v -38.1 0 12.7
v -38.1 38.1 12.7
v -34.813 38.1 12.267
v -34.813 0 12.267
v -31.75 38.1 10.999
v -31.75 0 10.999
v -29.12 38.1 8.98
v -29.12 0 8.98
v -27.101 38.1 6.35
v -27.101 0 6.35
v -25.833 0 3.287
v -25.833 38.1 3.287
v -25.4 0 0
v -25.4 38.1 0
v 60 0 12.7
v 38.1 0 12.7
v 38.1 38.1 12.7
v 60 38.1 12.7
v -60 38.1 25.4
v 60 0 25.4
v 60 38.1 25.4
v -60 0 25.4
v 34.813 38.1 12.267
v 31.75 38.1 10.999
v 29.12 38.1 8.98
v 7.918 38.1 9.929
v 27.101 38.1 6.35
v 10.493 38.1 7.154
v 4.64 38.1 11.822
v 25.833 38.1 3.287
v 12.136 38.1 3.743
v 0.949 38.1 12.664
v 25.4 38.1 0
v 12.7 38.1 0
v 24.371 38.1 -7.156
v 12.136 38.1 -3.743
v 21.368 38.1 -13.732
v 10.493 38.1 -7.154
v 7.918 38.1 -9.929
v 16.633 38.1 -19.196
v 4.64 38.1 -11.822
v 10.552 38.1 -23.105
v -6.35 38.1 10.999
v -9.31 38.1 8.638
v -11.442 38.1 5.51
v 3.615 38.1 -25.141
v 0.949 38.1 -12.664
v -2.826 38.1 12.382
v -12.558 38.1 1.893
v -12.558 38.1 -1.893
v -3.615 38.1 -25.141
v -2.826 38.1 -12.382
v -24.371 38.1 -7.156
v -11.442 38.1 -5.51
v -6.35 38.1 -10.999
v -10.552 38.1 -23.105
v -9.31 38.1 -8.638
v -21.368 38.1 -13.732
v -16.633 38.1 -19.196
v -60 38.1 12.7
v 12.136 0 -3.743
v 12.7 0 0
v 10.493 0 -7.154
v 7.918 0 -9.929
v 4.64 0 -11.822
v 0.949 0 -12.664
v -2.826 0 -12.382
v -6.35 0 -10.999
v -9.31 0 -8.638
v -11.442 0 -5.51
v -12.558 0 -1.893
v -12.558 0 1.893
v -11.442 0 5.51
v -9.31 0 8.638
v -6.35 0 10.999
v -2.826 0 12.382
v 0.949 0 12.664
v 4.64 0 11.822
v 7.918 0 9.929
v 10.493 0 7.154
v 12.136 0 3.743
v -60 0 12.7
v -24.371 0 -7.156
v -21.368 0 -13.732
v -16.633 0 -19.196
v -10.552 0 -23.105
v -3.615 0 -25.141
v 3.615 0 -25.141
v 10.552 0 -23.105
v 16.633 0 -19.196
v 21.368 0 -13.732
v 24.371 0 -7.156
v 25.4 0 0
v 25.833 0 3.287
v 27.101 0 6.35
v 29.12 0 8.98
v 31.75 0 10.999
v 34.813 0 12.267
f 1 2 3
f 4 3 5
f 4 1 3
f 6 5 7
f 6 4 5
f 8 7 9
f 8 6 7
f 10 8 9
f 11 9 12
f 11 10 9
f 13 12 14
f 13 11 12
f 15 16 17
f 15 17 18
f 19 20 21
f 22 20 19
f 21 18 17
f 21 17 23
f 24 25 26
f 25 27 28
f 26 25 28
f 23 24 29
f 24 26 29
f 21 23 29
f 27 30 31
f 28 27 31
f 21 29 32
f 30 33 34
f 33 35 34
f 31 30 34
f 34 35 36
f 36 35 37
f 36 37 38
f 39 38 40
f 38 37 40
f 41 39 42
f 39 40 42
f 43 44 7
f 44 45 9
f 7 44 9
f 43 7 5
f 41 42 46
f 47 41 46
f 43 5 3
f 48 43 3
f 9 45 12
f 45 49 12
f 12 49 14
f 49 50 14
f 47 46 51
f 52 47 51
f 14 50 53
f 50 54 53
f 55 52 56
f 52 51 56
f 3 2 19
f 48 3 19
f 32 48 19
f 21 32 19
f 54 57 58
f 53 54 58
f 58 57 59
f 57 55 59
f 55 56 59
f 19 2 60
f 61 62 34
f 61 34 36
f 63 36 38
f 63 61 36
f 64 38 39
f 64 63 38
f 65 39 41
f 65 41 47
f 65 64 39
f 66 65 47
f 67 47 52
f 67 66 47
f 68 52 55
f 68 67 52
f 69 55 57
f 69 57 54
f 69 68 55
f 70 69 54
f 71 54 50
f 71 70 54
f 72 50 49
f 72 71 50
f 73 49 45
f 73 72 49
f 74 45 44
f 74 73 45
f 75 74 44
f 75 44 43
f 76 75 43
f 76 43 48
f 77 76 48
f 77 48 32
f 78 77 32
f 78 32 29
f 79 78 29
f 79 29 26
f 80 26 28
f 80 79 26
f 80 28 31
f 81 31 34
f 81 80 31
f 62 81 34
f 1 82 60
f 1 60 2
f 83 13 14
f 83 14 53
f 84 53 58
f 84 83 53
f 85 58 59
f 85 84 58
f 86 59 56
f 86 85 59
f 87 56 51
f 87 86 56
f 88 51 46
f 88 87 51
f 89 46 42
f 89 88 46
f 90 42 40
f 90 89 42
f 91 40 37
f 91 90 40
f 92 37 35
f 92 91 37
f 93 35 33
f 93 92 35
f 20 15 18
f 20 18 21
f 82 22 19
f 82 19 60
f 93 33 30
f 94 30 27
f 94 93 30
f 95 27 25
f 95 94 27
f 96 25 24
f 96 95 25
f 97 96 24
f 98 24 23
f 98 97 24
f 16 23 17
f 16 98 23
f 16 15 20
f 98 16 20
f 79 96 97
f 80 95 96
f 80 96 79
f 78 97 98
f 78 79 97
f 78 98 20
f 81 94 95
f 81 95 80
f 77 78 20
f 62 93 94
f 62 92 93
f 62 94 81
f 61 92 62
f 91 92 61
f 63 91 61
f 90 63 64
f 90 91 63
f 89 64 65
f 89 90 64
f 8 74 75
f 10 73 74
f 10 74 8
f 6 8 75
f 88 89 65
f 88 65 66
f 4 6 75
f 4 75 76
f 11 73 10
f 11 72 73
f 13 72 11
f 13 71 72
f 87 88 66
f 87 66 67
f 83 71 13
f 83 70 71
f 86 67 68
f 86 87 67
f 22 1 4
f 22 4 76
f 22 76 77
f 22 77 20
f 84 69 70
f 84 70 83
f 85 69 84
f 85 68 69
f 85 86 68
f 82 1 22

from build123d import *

# Parameters (mm, degrees)
SKETCH1_R           = 12.7
BOSS_EXTRUDE1_DEPTH = 38.1


with BuildPart() as part:
    # Sketch1 → Boss-Extrude1 (new body)
    with BuildSketch(Plane(origin=(0, 0, 0), x_dir=(1, 0, 0), z_dir=(0, 1, 0))):
        with BuildLine():
            ThreePointArc((25.4, 0), (29.119743879, -8.980256121), (38.1, -12.7))
            Line((38.1, -12.7), (60, -12.7))
            Line((60, -12.7), (60, -25.4))
            Line((60, -25.4), (-60, -25.4))
            Line((-60, -25.4), (-60, -12.7))
            Line((-60, -12.7), (-38.1, -12.7))
            ThreePointArc((-38.1, -12.7), (-29.119743879, -8.980256121), (-25.4, 0))
            ThreePointArc((-25.4, 0), (0, 25.4), (25.4, 0))
        make_face()
        Circle(SKETCH1_R, mode=Mode.SUBTRACT)
    extrude(amount=BOSS_EXTRUDE1_DEPTH)


solid = part.part
